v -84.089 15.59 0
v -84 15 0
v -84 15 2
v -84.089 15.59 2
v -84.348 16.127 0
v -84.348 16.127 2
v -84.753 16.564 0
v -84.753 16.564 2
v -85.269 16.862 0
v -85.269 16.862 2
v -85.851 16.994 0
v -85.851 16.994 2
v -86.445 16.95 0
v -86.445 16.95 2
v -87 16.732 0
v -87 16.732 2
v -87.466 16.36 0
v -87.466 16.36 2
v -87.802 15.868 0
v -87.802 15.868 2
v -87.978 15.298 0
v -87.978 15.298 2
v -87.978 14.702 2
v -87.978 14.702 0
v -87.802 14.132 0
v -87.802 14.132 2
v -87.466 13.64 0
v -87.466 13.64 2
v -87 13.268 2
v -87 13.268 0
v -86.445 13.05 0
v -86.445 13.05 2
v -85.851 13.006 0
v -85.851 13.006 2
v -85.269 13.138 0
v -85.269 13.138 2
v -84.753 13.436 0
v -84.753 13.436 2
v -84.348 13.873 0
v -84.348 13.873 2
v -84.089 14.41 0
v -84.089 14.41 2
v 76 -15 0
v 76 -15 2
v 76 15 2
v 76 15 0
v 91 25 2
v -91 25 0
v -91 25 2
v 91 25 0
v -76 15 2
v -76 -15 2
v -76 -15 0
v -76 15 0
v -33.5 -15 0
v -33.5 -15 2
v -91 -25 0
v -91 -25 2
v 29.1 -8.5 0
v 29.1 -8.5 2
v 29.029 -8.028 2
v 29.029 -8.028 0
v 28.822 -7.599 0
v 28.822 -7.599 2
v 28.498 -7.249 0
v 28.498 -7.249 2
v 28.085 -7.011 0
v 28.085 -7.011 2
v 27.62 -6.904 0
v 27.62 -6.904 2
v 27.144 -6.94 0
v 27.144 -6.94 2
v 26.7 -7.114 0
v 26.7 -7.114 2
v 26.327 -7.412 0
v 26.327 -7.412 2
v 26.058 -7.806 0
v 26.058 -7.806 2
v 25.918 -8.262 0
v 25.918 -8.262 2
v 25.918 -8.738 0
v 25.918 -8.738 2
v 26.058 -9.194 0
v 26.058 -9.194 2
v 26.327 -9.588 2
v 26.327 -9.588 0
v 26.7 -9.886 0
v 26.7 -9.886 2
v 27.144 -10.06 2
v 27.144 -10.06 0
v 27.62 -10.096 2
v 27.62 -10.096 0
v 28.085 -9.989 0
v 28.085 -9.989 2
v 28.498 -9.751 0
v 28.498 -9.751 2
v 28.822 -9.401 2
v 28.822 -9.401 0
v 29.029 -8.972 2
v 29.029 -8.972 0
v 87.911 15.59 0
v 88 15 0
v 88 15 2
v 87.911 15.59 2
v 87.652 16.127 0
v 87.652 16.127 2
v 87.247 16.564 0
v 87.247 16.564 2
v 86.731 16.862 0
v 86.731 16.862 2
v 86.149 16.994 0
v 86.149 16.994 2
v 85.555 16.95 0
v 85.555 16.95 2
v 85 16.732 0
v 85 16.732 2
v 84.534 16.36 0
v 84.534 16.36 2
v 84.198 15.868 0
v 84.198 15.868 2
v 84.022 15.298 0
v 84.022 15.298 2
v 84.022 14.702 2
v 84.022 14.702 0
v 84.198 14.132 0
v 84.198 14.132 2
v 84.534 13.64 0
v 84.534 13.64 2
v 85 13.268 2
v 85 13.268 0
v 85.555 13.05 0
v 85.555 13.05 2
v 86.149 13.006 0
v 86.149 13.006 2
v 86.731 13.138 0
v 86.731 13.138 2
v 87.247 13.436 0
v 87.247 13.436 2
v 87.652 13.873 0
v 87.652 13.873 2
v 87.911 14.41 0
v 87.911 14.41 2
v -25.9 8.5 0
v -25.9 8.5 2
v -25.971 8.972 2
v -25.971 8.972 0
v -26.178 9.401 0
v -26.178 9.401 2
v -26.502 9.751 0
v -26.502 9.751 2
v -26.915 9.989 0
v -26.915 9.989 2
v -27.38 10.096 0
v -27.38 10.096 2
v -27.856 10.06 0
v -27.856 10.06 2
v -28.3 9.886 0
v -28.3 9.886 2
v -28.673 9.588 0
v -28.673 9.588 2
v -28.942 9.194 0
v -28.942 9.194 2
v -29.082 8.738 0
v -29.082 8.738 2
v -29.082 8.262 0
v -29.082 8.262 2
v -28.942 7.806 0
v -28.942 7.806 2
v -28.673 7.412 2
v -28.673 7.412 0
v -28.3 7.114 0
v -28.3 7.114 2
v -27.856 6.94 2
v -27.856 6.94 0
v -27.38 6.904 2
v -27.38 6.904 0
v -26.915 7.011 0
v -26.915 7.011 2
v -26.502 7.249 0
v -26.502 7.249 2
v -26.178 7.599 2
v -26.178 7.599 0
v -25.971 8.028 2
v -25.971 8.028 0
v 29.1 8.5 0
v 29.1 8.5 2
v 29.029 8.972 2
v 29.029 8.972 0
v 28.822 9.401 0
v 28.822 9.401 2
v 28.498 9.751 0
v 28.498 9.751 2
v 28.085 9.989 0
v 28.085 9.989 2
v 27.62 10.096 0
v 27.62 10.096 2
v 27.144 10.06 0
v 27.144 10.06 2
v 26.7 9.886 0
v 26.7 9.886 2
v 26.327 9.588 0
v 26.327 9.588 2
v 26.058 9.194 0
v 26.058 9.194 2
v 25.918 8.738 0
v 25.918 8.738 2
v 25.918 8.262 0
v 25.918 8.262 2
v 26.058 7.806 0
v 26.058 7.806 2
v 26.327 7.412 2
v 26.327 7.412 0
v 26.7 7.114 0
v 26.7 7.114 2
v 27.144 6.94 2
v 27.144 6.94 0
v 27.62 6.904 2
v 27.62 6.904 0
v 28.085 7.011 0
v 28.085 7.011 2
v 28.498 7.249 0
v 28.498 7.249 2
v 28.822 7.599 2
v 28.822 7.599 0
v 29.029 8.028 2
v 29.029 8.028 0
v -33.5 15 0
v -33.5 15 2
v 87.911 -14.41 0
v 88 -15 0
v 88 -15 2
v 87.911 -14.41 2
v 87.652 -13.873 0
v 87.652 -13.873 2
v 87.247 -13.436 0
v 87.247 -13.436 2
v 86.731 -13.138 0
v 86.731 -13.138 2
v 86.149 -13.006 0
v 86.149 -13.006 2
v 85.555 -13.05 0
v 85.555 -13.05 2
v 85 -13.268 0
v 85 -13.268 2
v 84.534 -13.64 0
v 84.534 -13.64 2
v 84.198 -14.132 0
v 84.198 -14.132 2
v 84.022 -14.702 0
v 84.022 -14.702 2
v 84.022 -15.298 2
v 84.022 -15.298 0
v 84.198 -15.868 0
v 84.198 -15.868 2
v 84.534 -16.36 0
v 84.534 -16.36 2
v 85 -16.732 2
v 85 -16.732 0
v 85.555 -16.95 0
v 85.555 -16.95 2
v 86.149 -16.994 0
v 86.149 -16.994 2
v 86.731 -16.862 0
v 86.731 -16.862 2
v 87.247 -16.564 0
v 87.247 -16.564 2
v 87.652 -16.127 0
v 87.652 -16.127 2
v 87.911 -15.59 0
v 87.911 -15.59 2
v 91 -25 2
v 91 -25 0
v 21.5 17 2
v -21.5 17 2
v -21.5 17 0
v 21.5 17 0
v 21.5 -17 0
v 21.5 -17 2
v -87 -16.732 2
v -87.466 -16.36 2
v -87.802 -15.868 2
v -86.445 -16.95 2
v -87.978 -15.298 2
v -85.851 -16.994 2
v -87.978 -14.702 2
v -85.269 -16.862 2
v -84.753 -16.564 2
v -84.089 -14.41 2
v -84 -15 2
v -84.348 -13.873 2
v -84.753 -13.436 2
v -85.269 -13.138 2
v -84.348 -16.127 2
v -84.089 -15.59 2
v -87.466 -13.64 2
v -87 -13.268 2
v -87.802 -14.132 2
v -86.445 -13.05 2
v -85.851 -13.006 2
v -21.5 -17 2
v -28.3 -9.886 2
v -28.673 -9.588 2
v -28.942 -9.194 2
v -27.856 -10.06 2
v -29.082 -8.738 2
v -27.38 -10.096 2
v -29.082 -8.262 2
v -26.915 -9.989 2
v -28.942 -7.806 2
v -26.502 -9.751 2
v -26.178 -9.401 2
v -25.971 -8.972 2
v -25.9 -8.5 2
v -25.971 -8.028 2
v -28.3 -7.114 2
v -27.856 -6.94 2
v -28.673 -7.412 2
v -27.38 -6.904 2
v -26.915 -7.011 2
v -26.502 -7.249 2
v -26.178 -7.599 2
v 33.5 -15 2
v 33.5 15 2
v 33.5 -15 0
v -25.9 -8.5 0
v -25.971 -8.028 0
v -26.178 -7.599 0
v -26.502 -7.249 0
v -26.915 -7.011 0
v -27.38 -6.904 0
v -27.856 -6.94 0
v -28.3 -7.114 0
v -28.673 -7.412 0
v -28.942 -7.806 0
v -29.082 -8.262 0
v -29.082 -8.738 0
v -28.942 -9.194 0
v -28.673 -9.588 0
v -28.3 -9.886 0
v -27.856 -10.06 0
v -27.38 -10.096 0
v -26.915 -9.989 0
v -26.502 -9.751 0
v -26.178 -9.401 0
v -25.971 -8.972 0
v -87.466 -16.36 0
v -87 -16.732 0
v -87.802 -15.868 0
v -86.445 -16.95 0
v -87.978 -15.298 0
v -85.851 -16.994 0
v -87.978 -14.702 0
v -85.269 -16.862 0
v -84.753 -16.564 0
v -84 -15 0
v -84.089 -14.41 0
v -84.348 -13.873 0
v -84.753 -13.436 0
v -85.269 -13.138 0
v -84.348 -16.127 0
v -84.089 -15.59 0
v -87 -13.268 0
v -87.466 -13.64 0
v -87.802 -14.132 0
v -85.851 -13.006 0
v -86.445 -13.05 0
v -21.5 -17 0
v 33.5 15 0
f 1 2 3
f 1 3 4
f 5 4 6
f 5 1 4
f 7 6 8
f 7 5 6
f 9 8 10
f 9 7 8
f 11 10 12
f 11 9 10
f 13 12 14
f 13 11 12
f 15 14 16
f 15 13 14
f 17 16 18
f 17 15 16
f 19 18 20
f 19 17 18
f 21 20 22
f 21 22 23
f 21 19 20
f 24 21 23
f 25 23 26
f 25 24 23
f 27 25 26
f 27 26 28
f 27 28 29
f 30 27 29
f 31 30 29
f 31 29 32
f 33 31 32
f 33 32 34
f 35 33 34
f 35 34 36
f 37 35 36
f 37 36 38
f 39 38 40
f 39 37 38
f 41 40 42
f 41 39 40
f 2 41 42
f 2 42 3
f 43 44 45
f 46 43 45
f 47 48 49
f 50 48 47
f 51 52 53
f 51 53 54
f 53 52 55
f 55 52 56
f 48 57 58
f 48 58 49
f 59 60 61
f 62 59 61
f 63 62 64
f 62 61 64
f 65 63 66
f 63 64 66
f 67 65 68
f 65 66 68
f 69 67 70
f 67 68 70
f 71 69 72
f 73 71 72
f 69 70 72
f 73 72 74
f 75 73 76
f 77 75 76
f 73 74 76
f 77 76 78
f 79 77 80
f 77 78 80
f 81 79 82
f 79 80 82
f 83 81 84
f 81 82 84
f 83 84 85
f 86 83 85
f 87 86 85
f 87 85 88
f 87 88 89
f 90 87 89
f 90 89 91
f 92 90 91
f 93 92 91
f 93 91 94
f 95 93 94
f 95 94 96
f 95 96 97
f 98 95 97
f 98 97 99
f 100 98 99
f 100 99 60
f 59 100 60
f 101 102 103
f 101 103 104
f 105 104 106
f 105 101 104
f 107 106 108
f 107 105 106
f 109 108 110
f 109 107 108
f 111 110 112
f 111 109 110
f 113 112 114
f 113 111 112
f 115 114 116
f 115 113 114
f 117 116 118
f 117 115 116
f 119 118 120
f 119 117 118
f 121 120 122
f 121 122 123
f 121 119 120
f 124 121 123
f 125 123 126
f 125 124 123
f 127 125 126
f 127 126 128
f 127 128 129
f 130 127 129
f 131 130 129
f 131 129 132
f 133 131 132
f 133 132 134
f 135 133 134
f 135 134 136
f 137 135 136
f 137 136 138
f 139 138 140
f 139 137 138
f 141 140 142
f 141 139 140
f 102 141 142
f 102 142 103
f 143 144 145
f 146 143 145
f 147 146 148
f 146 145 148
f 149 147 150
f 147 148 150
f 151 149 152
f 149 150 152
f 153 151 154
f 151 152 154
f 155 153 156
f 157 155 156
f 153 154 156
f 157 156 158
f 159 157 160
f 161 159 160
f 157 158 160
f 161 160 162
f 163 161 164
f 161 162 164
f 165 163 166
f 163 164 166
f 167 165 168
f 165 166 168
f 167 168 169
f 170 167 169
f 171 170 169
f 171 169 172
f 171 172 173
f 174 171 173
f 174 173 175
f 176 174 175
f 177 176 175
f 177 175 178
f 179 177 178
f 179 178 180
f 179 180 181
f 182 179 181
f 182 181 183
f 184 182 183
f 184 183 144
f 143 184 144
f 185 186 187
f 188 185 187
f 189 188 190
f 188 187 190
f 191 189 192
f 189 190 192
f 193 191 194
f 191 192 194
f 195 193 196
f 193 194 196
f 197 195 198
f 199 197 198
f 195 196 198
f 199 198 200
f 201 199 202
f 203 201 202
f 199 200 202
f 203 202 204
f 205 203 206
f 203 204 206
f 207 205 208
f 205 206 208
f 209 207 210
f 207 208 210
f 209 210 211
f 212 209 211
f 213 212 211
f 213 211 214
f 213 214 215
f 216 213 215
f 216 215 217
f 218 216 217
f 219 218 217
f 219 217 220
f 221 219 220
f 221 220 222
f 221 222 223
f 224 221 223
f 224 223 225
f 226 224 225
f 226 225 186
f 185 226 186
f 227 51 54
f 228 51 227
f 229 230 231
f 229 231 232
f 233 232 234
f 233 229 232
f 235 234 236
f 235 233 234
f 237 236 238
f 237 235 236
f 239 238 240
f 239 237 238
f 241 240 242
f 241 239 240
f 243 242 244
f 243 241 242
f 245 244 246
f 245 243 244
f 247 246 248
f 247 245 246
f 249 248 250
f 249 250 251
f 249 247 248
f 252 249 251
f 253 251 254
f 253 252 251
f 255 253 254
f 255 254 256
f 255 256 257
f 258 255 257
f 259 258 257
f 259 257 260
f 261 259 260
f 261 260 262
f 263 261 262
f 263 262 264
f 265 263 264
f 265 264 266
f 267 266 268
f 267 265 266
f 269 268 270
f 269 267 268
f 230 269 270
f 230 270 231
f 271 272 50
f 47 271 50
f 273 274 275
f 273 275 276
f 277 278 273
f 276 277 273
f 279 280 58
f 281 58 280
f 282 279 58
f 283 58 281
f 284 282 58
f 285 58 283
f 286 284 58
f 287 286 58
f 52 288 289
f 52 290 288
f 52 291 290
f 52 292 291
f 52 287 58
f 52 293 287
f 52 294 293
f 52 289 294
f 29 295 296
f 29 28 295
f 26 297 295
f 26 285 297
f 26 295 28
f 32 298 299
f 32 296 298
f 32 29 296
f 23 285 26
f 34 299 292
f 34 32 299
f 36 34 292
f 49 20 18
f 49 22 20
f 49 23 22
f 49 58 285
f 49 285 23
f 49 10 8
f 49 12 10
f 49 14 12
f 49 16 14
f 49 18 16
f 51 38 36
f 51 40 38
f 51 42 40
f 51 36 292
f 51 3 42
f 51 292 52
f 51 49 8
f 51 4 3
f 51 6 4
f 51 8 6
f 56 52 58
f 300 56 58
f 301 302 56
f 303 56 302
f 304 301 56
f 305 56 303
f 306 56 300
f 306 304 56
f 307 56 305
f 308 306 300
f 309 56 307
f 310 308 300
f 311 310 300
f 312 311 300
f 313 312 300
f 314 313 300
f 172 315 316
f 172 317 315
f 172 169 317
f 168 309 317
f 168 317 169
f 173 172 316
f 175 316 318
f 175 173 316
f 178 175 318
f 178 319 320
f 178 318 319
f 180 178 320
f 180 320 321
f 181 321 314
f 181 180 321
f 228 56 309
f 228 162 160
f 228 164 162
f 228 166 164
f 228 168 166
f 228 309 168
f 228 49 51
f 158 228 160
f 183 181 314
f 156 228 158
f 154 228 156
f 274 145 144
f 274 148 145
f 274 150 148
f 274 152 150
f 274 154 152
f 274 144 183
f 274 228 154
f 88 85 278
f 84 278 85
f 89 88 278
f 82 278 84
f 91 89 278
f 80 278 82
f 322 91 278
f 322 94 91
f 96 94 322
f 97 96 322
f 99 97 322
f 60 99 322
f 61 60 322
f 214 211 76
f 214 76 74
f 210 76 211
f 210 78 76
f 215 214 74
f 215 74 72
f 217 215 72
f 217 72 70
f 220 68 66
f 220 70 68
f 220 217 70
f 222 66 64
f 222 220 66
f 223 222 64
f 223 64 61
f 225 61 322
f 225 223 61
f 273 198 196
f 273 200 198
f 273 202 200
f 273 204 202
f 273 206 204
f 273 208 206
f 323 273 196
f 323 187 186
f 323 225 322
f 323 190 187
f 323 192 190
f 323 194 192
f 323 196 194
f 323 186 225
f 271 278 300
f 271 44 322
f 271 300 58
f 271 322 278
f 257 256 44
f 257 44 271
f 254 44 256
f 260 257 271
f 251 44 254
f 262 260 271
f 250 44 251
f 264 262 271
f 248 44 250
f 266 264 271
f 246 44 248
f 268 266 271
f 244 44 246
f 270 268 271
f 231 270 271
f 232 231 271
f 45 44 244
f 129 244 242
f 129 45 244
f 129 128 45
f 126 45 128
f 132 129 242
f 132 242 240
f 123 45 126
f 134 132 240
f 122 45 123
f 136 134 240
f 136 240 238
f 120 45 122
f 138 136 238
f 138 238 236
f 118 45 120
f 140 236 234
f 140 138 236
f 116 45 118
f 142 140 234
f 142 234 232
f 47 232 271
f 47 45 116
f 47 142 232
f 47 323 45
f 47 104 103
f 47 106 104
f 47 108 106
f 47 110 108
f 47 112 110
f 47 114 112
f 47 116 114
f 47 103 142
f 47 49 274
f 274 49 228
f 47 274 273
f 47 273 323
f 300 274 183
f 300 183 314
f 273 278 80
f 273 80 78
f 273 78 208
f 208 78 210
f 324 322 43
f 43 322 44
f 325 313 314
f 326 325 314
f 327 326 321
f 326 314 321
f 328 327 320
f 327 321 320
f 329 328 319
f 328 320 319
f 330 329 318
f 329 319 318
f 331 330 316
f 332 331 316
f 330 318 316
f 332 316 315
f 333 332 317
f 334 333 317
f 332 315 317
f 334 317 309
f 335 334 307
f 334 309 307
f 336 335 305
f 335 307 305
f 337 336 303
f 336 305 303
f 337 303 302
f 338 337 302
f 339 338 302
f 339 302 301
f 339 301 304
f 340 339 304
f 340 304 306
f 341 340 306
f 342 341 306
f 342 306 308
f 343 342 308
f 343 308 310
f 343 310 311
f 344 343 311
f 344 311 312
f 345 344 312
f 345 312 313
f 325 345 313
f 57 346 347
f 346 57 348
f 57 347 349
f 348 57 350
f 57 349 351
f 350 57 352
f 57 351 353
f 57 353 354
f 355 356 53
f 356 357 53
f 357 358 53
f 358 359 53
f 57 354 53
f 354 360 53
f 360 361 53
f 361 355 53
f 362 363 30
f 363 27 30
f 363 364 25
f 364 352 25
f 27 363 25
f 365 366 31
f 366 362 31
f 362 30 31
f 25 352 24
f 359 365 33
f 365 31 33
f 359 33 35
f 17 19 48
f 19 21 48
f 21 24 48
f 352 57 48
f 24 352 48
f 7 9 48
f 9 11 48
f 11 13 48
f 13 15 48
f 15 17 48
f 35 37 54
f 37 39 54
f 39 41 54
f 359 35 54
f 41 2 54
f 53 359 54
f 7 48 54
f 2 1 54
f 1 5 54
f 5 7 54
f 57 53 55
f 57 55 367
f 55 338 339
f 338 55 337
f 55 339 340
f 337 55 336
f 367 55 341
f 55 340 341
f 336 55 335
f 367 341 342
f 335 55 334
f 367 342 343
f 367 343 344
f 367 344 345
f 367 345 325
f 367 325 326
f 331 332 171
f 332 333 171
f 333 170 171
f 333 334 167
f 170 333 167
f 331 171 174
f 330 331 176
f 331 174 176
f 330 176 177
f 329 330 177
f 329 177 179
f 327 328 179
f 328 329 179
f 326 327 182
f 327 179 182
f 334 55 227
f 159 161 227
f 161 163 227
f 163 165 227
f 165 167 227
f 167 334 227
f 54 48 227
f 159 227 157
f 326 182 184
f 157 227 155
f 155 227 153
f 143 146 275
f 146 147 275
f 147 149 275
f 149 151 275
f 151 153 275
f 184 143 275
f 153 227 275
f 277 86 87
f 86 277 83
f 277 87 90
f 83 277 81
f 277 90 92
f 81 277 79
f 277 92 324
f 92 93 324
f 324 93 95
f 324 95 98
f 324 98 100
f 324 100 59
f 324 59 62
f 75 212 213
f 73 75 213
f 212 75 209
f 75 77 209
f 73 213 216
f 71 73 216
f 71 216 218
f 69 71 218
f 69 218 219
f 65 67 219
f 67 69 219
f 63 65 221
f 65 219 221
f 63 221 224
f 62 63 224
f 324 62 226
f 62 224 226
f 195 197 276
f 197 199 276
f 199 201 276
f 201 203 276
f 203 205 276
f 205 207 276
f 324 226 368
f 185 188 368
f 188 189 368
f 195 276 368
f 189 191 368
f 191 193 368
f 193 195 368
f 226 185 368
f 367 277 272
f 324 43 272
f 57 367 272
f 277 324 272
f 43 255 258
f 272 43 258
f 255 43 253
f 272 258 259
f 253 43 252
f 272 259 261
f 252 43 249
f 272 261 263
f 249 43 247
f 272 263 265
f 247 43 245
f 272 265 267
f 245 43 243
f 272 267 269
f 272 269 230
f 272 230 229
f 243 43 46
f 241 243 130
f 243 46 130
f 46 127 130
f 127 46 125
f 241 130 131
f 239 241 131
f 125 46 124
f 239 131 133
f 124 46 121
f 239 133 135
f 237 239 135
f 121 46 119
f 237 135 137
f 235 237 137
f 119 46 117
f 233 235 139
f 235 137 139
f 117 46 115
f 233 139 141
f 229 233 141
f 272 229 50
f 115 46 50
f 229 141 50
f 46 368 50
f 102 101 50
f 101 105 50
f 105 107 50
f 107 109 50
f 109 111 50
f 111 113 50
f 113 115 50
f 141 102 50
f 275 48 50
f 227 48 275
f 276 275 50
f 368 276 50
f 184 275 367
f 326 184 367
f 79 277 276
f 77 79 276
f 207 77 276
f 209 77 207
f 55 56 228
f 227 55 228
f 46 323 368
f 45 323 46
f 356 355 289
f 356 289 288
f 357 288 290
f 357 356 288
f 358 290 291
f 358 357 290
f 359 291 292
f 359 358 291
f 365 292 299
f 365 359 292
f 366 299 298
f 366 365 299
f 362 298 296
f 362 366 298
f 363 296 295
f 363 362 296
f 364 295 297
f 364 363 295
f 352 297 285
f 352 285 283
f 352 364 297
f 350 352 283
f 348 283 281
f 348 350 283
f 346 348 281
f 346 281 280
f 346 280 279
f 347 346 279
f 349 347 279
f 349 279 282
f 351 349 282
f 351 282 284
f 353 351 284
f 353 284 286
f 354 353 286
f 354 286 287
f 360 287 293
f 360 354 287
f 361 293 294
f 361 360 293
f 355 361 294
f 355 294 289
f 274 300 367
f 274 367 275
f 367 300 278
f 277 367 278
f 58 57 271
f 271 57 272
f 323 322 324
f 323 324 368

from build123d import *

# Parameters (mm, degrees)
SKETCH_1_W          = 182
SKETCH_1_H          = 50
SKETCH_1_R          = 2
EXTRUDE_1_DEPTH     = 2
SKETCH_2_R          = 1.6
CUT_EXTRUDE_1_DEPTH = 95.392796335
SKETCH_3_W          = 43
SKETCH_3_H          = 34
SKETCH_3_W_2        = 42.5
SKETCH_3_H_2        = 30
CUT_EXTRUDE_2_DEPTH = 95.392796335


with BuildPart() as part:
    # 草图1 → 凸台-拉伸1 (new body)
    with BuildSketch(Plane.XY):
        Rectangle(SKETCH_1_W, SKETCH_1_H)
        with Locations((-86, 15)):
            Circle(SKETCH_1_R, mode=Mode.SUBTRACT)
        with Locations((86, 15)):
            Circle(SKETCH_1_R, mode=Mode.SUBTRACT)
        with Locations((-86, -15)):
            Circle(SKETCH_1_R, mode=Mode.SUBTRACT)
        with Locations((86, -15)):
            Circle(SKETCH_1_R, mode=Mode.SUBTRACT)
    extrude(amount=EXTRUDE_1_DEPTH)

    # 草图2 → 切除-拉伸1 (cut, through all)
    with BuildSketch(Plane.XY.offset(2)):
        with Locations((-27.5, 8.5)):
            Circle(SKETCH_2_R)
        with Locations((-27.5, -8.5)):
            Circle(SKETCH_2_R)
        with Locations((27.5, 8.5)):
            Circle(SKETCH_2_R)
        with Locations((27.5, -8.5)):
            Circle(SKETCH_2_R)
    extrude(amount=-CUT_EXTRUDE_1_DEPTH, mode=Mode.SUBTRACT)

    # 草图3 → 切除-拉伸2 (cut, through all)
    with BuildSketch(Plane.XY.offset(2)):
        Rectangle(SKETCH_3_W, SKETCH_3_H)
        with Locations((-54.75, 0)):
            Rectangle(SKETCH_3_W_2, SKETCH_3_H_2)
        with Locations((54.75, 0)):
            Rectangle(SKETCH_3_W_2, SKETCH_3_H_2)
    extrude(amount=-CUT_EXTRUDE_2_DEPTH, mode=Mode.SUBTRACT)


solid = part.part
